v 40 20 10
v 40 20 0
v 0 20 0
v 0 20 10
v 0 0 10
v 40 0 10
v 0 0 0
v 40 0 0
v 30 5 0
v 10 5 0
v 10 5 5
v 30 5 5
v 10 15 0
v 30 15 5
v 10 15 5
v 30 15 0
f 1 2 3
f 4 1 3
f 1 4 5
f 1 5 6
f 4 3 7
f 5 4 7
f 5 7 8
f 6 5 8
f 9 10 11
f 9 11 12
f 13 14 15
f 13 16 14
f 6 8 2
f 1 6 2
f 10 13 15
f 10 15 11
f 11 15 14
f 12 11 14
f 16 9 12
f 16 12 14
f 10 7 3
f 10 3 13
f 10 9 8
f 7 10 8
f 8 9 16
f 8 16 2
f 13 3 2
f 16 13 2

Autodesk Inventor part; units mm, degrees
ref_plane "YZ Plane" through (0, 0, 0) normal (1, 0, 0) x (0, 1, 0)
ref_plane "XZ Plane" through (0, 0, 0) normal (0, 1, 0) x (-1, 0, 0)
ref_plane "XY Plane" through (0, 0, 0) normal (0, 0, 1) x (1, 0, 0)
sketch "Sketch1" plane through (0, 0, 0) normal (0, 0, 1) x (1, 0, 0)
  line L0 (0, 0) -> (40, 0)
  line L1 (40, 0) -> (40, 20)
  line L2 (40, 20) -> (0, 20)
  line L3 (0, 20) -> (0, 0)
extrude "Extrusion1" add sketch "Sketch1" along normal blind 10
sketch "Sketch2" plane through (0, 0, 0) normal (0, 0, 1) x (1, 0, 0)
  line L0 (10, 5) -> (30, 5)
  line L1 (30, 5) -> (30, 15)
  line L2 (30, 15) -> (10, 15)
  line L3 (10, 15) -> (10, 5)
extrude "Extrusion2" cut sketch "Sketch2" along normal blind 5
properties part number "17_box_cut"
